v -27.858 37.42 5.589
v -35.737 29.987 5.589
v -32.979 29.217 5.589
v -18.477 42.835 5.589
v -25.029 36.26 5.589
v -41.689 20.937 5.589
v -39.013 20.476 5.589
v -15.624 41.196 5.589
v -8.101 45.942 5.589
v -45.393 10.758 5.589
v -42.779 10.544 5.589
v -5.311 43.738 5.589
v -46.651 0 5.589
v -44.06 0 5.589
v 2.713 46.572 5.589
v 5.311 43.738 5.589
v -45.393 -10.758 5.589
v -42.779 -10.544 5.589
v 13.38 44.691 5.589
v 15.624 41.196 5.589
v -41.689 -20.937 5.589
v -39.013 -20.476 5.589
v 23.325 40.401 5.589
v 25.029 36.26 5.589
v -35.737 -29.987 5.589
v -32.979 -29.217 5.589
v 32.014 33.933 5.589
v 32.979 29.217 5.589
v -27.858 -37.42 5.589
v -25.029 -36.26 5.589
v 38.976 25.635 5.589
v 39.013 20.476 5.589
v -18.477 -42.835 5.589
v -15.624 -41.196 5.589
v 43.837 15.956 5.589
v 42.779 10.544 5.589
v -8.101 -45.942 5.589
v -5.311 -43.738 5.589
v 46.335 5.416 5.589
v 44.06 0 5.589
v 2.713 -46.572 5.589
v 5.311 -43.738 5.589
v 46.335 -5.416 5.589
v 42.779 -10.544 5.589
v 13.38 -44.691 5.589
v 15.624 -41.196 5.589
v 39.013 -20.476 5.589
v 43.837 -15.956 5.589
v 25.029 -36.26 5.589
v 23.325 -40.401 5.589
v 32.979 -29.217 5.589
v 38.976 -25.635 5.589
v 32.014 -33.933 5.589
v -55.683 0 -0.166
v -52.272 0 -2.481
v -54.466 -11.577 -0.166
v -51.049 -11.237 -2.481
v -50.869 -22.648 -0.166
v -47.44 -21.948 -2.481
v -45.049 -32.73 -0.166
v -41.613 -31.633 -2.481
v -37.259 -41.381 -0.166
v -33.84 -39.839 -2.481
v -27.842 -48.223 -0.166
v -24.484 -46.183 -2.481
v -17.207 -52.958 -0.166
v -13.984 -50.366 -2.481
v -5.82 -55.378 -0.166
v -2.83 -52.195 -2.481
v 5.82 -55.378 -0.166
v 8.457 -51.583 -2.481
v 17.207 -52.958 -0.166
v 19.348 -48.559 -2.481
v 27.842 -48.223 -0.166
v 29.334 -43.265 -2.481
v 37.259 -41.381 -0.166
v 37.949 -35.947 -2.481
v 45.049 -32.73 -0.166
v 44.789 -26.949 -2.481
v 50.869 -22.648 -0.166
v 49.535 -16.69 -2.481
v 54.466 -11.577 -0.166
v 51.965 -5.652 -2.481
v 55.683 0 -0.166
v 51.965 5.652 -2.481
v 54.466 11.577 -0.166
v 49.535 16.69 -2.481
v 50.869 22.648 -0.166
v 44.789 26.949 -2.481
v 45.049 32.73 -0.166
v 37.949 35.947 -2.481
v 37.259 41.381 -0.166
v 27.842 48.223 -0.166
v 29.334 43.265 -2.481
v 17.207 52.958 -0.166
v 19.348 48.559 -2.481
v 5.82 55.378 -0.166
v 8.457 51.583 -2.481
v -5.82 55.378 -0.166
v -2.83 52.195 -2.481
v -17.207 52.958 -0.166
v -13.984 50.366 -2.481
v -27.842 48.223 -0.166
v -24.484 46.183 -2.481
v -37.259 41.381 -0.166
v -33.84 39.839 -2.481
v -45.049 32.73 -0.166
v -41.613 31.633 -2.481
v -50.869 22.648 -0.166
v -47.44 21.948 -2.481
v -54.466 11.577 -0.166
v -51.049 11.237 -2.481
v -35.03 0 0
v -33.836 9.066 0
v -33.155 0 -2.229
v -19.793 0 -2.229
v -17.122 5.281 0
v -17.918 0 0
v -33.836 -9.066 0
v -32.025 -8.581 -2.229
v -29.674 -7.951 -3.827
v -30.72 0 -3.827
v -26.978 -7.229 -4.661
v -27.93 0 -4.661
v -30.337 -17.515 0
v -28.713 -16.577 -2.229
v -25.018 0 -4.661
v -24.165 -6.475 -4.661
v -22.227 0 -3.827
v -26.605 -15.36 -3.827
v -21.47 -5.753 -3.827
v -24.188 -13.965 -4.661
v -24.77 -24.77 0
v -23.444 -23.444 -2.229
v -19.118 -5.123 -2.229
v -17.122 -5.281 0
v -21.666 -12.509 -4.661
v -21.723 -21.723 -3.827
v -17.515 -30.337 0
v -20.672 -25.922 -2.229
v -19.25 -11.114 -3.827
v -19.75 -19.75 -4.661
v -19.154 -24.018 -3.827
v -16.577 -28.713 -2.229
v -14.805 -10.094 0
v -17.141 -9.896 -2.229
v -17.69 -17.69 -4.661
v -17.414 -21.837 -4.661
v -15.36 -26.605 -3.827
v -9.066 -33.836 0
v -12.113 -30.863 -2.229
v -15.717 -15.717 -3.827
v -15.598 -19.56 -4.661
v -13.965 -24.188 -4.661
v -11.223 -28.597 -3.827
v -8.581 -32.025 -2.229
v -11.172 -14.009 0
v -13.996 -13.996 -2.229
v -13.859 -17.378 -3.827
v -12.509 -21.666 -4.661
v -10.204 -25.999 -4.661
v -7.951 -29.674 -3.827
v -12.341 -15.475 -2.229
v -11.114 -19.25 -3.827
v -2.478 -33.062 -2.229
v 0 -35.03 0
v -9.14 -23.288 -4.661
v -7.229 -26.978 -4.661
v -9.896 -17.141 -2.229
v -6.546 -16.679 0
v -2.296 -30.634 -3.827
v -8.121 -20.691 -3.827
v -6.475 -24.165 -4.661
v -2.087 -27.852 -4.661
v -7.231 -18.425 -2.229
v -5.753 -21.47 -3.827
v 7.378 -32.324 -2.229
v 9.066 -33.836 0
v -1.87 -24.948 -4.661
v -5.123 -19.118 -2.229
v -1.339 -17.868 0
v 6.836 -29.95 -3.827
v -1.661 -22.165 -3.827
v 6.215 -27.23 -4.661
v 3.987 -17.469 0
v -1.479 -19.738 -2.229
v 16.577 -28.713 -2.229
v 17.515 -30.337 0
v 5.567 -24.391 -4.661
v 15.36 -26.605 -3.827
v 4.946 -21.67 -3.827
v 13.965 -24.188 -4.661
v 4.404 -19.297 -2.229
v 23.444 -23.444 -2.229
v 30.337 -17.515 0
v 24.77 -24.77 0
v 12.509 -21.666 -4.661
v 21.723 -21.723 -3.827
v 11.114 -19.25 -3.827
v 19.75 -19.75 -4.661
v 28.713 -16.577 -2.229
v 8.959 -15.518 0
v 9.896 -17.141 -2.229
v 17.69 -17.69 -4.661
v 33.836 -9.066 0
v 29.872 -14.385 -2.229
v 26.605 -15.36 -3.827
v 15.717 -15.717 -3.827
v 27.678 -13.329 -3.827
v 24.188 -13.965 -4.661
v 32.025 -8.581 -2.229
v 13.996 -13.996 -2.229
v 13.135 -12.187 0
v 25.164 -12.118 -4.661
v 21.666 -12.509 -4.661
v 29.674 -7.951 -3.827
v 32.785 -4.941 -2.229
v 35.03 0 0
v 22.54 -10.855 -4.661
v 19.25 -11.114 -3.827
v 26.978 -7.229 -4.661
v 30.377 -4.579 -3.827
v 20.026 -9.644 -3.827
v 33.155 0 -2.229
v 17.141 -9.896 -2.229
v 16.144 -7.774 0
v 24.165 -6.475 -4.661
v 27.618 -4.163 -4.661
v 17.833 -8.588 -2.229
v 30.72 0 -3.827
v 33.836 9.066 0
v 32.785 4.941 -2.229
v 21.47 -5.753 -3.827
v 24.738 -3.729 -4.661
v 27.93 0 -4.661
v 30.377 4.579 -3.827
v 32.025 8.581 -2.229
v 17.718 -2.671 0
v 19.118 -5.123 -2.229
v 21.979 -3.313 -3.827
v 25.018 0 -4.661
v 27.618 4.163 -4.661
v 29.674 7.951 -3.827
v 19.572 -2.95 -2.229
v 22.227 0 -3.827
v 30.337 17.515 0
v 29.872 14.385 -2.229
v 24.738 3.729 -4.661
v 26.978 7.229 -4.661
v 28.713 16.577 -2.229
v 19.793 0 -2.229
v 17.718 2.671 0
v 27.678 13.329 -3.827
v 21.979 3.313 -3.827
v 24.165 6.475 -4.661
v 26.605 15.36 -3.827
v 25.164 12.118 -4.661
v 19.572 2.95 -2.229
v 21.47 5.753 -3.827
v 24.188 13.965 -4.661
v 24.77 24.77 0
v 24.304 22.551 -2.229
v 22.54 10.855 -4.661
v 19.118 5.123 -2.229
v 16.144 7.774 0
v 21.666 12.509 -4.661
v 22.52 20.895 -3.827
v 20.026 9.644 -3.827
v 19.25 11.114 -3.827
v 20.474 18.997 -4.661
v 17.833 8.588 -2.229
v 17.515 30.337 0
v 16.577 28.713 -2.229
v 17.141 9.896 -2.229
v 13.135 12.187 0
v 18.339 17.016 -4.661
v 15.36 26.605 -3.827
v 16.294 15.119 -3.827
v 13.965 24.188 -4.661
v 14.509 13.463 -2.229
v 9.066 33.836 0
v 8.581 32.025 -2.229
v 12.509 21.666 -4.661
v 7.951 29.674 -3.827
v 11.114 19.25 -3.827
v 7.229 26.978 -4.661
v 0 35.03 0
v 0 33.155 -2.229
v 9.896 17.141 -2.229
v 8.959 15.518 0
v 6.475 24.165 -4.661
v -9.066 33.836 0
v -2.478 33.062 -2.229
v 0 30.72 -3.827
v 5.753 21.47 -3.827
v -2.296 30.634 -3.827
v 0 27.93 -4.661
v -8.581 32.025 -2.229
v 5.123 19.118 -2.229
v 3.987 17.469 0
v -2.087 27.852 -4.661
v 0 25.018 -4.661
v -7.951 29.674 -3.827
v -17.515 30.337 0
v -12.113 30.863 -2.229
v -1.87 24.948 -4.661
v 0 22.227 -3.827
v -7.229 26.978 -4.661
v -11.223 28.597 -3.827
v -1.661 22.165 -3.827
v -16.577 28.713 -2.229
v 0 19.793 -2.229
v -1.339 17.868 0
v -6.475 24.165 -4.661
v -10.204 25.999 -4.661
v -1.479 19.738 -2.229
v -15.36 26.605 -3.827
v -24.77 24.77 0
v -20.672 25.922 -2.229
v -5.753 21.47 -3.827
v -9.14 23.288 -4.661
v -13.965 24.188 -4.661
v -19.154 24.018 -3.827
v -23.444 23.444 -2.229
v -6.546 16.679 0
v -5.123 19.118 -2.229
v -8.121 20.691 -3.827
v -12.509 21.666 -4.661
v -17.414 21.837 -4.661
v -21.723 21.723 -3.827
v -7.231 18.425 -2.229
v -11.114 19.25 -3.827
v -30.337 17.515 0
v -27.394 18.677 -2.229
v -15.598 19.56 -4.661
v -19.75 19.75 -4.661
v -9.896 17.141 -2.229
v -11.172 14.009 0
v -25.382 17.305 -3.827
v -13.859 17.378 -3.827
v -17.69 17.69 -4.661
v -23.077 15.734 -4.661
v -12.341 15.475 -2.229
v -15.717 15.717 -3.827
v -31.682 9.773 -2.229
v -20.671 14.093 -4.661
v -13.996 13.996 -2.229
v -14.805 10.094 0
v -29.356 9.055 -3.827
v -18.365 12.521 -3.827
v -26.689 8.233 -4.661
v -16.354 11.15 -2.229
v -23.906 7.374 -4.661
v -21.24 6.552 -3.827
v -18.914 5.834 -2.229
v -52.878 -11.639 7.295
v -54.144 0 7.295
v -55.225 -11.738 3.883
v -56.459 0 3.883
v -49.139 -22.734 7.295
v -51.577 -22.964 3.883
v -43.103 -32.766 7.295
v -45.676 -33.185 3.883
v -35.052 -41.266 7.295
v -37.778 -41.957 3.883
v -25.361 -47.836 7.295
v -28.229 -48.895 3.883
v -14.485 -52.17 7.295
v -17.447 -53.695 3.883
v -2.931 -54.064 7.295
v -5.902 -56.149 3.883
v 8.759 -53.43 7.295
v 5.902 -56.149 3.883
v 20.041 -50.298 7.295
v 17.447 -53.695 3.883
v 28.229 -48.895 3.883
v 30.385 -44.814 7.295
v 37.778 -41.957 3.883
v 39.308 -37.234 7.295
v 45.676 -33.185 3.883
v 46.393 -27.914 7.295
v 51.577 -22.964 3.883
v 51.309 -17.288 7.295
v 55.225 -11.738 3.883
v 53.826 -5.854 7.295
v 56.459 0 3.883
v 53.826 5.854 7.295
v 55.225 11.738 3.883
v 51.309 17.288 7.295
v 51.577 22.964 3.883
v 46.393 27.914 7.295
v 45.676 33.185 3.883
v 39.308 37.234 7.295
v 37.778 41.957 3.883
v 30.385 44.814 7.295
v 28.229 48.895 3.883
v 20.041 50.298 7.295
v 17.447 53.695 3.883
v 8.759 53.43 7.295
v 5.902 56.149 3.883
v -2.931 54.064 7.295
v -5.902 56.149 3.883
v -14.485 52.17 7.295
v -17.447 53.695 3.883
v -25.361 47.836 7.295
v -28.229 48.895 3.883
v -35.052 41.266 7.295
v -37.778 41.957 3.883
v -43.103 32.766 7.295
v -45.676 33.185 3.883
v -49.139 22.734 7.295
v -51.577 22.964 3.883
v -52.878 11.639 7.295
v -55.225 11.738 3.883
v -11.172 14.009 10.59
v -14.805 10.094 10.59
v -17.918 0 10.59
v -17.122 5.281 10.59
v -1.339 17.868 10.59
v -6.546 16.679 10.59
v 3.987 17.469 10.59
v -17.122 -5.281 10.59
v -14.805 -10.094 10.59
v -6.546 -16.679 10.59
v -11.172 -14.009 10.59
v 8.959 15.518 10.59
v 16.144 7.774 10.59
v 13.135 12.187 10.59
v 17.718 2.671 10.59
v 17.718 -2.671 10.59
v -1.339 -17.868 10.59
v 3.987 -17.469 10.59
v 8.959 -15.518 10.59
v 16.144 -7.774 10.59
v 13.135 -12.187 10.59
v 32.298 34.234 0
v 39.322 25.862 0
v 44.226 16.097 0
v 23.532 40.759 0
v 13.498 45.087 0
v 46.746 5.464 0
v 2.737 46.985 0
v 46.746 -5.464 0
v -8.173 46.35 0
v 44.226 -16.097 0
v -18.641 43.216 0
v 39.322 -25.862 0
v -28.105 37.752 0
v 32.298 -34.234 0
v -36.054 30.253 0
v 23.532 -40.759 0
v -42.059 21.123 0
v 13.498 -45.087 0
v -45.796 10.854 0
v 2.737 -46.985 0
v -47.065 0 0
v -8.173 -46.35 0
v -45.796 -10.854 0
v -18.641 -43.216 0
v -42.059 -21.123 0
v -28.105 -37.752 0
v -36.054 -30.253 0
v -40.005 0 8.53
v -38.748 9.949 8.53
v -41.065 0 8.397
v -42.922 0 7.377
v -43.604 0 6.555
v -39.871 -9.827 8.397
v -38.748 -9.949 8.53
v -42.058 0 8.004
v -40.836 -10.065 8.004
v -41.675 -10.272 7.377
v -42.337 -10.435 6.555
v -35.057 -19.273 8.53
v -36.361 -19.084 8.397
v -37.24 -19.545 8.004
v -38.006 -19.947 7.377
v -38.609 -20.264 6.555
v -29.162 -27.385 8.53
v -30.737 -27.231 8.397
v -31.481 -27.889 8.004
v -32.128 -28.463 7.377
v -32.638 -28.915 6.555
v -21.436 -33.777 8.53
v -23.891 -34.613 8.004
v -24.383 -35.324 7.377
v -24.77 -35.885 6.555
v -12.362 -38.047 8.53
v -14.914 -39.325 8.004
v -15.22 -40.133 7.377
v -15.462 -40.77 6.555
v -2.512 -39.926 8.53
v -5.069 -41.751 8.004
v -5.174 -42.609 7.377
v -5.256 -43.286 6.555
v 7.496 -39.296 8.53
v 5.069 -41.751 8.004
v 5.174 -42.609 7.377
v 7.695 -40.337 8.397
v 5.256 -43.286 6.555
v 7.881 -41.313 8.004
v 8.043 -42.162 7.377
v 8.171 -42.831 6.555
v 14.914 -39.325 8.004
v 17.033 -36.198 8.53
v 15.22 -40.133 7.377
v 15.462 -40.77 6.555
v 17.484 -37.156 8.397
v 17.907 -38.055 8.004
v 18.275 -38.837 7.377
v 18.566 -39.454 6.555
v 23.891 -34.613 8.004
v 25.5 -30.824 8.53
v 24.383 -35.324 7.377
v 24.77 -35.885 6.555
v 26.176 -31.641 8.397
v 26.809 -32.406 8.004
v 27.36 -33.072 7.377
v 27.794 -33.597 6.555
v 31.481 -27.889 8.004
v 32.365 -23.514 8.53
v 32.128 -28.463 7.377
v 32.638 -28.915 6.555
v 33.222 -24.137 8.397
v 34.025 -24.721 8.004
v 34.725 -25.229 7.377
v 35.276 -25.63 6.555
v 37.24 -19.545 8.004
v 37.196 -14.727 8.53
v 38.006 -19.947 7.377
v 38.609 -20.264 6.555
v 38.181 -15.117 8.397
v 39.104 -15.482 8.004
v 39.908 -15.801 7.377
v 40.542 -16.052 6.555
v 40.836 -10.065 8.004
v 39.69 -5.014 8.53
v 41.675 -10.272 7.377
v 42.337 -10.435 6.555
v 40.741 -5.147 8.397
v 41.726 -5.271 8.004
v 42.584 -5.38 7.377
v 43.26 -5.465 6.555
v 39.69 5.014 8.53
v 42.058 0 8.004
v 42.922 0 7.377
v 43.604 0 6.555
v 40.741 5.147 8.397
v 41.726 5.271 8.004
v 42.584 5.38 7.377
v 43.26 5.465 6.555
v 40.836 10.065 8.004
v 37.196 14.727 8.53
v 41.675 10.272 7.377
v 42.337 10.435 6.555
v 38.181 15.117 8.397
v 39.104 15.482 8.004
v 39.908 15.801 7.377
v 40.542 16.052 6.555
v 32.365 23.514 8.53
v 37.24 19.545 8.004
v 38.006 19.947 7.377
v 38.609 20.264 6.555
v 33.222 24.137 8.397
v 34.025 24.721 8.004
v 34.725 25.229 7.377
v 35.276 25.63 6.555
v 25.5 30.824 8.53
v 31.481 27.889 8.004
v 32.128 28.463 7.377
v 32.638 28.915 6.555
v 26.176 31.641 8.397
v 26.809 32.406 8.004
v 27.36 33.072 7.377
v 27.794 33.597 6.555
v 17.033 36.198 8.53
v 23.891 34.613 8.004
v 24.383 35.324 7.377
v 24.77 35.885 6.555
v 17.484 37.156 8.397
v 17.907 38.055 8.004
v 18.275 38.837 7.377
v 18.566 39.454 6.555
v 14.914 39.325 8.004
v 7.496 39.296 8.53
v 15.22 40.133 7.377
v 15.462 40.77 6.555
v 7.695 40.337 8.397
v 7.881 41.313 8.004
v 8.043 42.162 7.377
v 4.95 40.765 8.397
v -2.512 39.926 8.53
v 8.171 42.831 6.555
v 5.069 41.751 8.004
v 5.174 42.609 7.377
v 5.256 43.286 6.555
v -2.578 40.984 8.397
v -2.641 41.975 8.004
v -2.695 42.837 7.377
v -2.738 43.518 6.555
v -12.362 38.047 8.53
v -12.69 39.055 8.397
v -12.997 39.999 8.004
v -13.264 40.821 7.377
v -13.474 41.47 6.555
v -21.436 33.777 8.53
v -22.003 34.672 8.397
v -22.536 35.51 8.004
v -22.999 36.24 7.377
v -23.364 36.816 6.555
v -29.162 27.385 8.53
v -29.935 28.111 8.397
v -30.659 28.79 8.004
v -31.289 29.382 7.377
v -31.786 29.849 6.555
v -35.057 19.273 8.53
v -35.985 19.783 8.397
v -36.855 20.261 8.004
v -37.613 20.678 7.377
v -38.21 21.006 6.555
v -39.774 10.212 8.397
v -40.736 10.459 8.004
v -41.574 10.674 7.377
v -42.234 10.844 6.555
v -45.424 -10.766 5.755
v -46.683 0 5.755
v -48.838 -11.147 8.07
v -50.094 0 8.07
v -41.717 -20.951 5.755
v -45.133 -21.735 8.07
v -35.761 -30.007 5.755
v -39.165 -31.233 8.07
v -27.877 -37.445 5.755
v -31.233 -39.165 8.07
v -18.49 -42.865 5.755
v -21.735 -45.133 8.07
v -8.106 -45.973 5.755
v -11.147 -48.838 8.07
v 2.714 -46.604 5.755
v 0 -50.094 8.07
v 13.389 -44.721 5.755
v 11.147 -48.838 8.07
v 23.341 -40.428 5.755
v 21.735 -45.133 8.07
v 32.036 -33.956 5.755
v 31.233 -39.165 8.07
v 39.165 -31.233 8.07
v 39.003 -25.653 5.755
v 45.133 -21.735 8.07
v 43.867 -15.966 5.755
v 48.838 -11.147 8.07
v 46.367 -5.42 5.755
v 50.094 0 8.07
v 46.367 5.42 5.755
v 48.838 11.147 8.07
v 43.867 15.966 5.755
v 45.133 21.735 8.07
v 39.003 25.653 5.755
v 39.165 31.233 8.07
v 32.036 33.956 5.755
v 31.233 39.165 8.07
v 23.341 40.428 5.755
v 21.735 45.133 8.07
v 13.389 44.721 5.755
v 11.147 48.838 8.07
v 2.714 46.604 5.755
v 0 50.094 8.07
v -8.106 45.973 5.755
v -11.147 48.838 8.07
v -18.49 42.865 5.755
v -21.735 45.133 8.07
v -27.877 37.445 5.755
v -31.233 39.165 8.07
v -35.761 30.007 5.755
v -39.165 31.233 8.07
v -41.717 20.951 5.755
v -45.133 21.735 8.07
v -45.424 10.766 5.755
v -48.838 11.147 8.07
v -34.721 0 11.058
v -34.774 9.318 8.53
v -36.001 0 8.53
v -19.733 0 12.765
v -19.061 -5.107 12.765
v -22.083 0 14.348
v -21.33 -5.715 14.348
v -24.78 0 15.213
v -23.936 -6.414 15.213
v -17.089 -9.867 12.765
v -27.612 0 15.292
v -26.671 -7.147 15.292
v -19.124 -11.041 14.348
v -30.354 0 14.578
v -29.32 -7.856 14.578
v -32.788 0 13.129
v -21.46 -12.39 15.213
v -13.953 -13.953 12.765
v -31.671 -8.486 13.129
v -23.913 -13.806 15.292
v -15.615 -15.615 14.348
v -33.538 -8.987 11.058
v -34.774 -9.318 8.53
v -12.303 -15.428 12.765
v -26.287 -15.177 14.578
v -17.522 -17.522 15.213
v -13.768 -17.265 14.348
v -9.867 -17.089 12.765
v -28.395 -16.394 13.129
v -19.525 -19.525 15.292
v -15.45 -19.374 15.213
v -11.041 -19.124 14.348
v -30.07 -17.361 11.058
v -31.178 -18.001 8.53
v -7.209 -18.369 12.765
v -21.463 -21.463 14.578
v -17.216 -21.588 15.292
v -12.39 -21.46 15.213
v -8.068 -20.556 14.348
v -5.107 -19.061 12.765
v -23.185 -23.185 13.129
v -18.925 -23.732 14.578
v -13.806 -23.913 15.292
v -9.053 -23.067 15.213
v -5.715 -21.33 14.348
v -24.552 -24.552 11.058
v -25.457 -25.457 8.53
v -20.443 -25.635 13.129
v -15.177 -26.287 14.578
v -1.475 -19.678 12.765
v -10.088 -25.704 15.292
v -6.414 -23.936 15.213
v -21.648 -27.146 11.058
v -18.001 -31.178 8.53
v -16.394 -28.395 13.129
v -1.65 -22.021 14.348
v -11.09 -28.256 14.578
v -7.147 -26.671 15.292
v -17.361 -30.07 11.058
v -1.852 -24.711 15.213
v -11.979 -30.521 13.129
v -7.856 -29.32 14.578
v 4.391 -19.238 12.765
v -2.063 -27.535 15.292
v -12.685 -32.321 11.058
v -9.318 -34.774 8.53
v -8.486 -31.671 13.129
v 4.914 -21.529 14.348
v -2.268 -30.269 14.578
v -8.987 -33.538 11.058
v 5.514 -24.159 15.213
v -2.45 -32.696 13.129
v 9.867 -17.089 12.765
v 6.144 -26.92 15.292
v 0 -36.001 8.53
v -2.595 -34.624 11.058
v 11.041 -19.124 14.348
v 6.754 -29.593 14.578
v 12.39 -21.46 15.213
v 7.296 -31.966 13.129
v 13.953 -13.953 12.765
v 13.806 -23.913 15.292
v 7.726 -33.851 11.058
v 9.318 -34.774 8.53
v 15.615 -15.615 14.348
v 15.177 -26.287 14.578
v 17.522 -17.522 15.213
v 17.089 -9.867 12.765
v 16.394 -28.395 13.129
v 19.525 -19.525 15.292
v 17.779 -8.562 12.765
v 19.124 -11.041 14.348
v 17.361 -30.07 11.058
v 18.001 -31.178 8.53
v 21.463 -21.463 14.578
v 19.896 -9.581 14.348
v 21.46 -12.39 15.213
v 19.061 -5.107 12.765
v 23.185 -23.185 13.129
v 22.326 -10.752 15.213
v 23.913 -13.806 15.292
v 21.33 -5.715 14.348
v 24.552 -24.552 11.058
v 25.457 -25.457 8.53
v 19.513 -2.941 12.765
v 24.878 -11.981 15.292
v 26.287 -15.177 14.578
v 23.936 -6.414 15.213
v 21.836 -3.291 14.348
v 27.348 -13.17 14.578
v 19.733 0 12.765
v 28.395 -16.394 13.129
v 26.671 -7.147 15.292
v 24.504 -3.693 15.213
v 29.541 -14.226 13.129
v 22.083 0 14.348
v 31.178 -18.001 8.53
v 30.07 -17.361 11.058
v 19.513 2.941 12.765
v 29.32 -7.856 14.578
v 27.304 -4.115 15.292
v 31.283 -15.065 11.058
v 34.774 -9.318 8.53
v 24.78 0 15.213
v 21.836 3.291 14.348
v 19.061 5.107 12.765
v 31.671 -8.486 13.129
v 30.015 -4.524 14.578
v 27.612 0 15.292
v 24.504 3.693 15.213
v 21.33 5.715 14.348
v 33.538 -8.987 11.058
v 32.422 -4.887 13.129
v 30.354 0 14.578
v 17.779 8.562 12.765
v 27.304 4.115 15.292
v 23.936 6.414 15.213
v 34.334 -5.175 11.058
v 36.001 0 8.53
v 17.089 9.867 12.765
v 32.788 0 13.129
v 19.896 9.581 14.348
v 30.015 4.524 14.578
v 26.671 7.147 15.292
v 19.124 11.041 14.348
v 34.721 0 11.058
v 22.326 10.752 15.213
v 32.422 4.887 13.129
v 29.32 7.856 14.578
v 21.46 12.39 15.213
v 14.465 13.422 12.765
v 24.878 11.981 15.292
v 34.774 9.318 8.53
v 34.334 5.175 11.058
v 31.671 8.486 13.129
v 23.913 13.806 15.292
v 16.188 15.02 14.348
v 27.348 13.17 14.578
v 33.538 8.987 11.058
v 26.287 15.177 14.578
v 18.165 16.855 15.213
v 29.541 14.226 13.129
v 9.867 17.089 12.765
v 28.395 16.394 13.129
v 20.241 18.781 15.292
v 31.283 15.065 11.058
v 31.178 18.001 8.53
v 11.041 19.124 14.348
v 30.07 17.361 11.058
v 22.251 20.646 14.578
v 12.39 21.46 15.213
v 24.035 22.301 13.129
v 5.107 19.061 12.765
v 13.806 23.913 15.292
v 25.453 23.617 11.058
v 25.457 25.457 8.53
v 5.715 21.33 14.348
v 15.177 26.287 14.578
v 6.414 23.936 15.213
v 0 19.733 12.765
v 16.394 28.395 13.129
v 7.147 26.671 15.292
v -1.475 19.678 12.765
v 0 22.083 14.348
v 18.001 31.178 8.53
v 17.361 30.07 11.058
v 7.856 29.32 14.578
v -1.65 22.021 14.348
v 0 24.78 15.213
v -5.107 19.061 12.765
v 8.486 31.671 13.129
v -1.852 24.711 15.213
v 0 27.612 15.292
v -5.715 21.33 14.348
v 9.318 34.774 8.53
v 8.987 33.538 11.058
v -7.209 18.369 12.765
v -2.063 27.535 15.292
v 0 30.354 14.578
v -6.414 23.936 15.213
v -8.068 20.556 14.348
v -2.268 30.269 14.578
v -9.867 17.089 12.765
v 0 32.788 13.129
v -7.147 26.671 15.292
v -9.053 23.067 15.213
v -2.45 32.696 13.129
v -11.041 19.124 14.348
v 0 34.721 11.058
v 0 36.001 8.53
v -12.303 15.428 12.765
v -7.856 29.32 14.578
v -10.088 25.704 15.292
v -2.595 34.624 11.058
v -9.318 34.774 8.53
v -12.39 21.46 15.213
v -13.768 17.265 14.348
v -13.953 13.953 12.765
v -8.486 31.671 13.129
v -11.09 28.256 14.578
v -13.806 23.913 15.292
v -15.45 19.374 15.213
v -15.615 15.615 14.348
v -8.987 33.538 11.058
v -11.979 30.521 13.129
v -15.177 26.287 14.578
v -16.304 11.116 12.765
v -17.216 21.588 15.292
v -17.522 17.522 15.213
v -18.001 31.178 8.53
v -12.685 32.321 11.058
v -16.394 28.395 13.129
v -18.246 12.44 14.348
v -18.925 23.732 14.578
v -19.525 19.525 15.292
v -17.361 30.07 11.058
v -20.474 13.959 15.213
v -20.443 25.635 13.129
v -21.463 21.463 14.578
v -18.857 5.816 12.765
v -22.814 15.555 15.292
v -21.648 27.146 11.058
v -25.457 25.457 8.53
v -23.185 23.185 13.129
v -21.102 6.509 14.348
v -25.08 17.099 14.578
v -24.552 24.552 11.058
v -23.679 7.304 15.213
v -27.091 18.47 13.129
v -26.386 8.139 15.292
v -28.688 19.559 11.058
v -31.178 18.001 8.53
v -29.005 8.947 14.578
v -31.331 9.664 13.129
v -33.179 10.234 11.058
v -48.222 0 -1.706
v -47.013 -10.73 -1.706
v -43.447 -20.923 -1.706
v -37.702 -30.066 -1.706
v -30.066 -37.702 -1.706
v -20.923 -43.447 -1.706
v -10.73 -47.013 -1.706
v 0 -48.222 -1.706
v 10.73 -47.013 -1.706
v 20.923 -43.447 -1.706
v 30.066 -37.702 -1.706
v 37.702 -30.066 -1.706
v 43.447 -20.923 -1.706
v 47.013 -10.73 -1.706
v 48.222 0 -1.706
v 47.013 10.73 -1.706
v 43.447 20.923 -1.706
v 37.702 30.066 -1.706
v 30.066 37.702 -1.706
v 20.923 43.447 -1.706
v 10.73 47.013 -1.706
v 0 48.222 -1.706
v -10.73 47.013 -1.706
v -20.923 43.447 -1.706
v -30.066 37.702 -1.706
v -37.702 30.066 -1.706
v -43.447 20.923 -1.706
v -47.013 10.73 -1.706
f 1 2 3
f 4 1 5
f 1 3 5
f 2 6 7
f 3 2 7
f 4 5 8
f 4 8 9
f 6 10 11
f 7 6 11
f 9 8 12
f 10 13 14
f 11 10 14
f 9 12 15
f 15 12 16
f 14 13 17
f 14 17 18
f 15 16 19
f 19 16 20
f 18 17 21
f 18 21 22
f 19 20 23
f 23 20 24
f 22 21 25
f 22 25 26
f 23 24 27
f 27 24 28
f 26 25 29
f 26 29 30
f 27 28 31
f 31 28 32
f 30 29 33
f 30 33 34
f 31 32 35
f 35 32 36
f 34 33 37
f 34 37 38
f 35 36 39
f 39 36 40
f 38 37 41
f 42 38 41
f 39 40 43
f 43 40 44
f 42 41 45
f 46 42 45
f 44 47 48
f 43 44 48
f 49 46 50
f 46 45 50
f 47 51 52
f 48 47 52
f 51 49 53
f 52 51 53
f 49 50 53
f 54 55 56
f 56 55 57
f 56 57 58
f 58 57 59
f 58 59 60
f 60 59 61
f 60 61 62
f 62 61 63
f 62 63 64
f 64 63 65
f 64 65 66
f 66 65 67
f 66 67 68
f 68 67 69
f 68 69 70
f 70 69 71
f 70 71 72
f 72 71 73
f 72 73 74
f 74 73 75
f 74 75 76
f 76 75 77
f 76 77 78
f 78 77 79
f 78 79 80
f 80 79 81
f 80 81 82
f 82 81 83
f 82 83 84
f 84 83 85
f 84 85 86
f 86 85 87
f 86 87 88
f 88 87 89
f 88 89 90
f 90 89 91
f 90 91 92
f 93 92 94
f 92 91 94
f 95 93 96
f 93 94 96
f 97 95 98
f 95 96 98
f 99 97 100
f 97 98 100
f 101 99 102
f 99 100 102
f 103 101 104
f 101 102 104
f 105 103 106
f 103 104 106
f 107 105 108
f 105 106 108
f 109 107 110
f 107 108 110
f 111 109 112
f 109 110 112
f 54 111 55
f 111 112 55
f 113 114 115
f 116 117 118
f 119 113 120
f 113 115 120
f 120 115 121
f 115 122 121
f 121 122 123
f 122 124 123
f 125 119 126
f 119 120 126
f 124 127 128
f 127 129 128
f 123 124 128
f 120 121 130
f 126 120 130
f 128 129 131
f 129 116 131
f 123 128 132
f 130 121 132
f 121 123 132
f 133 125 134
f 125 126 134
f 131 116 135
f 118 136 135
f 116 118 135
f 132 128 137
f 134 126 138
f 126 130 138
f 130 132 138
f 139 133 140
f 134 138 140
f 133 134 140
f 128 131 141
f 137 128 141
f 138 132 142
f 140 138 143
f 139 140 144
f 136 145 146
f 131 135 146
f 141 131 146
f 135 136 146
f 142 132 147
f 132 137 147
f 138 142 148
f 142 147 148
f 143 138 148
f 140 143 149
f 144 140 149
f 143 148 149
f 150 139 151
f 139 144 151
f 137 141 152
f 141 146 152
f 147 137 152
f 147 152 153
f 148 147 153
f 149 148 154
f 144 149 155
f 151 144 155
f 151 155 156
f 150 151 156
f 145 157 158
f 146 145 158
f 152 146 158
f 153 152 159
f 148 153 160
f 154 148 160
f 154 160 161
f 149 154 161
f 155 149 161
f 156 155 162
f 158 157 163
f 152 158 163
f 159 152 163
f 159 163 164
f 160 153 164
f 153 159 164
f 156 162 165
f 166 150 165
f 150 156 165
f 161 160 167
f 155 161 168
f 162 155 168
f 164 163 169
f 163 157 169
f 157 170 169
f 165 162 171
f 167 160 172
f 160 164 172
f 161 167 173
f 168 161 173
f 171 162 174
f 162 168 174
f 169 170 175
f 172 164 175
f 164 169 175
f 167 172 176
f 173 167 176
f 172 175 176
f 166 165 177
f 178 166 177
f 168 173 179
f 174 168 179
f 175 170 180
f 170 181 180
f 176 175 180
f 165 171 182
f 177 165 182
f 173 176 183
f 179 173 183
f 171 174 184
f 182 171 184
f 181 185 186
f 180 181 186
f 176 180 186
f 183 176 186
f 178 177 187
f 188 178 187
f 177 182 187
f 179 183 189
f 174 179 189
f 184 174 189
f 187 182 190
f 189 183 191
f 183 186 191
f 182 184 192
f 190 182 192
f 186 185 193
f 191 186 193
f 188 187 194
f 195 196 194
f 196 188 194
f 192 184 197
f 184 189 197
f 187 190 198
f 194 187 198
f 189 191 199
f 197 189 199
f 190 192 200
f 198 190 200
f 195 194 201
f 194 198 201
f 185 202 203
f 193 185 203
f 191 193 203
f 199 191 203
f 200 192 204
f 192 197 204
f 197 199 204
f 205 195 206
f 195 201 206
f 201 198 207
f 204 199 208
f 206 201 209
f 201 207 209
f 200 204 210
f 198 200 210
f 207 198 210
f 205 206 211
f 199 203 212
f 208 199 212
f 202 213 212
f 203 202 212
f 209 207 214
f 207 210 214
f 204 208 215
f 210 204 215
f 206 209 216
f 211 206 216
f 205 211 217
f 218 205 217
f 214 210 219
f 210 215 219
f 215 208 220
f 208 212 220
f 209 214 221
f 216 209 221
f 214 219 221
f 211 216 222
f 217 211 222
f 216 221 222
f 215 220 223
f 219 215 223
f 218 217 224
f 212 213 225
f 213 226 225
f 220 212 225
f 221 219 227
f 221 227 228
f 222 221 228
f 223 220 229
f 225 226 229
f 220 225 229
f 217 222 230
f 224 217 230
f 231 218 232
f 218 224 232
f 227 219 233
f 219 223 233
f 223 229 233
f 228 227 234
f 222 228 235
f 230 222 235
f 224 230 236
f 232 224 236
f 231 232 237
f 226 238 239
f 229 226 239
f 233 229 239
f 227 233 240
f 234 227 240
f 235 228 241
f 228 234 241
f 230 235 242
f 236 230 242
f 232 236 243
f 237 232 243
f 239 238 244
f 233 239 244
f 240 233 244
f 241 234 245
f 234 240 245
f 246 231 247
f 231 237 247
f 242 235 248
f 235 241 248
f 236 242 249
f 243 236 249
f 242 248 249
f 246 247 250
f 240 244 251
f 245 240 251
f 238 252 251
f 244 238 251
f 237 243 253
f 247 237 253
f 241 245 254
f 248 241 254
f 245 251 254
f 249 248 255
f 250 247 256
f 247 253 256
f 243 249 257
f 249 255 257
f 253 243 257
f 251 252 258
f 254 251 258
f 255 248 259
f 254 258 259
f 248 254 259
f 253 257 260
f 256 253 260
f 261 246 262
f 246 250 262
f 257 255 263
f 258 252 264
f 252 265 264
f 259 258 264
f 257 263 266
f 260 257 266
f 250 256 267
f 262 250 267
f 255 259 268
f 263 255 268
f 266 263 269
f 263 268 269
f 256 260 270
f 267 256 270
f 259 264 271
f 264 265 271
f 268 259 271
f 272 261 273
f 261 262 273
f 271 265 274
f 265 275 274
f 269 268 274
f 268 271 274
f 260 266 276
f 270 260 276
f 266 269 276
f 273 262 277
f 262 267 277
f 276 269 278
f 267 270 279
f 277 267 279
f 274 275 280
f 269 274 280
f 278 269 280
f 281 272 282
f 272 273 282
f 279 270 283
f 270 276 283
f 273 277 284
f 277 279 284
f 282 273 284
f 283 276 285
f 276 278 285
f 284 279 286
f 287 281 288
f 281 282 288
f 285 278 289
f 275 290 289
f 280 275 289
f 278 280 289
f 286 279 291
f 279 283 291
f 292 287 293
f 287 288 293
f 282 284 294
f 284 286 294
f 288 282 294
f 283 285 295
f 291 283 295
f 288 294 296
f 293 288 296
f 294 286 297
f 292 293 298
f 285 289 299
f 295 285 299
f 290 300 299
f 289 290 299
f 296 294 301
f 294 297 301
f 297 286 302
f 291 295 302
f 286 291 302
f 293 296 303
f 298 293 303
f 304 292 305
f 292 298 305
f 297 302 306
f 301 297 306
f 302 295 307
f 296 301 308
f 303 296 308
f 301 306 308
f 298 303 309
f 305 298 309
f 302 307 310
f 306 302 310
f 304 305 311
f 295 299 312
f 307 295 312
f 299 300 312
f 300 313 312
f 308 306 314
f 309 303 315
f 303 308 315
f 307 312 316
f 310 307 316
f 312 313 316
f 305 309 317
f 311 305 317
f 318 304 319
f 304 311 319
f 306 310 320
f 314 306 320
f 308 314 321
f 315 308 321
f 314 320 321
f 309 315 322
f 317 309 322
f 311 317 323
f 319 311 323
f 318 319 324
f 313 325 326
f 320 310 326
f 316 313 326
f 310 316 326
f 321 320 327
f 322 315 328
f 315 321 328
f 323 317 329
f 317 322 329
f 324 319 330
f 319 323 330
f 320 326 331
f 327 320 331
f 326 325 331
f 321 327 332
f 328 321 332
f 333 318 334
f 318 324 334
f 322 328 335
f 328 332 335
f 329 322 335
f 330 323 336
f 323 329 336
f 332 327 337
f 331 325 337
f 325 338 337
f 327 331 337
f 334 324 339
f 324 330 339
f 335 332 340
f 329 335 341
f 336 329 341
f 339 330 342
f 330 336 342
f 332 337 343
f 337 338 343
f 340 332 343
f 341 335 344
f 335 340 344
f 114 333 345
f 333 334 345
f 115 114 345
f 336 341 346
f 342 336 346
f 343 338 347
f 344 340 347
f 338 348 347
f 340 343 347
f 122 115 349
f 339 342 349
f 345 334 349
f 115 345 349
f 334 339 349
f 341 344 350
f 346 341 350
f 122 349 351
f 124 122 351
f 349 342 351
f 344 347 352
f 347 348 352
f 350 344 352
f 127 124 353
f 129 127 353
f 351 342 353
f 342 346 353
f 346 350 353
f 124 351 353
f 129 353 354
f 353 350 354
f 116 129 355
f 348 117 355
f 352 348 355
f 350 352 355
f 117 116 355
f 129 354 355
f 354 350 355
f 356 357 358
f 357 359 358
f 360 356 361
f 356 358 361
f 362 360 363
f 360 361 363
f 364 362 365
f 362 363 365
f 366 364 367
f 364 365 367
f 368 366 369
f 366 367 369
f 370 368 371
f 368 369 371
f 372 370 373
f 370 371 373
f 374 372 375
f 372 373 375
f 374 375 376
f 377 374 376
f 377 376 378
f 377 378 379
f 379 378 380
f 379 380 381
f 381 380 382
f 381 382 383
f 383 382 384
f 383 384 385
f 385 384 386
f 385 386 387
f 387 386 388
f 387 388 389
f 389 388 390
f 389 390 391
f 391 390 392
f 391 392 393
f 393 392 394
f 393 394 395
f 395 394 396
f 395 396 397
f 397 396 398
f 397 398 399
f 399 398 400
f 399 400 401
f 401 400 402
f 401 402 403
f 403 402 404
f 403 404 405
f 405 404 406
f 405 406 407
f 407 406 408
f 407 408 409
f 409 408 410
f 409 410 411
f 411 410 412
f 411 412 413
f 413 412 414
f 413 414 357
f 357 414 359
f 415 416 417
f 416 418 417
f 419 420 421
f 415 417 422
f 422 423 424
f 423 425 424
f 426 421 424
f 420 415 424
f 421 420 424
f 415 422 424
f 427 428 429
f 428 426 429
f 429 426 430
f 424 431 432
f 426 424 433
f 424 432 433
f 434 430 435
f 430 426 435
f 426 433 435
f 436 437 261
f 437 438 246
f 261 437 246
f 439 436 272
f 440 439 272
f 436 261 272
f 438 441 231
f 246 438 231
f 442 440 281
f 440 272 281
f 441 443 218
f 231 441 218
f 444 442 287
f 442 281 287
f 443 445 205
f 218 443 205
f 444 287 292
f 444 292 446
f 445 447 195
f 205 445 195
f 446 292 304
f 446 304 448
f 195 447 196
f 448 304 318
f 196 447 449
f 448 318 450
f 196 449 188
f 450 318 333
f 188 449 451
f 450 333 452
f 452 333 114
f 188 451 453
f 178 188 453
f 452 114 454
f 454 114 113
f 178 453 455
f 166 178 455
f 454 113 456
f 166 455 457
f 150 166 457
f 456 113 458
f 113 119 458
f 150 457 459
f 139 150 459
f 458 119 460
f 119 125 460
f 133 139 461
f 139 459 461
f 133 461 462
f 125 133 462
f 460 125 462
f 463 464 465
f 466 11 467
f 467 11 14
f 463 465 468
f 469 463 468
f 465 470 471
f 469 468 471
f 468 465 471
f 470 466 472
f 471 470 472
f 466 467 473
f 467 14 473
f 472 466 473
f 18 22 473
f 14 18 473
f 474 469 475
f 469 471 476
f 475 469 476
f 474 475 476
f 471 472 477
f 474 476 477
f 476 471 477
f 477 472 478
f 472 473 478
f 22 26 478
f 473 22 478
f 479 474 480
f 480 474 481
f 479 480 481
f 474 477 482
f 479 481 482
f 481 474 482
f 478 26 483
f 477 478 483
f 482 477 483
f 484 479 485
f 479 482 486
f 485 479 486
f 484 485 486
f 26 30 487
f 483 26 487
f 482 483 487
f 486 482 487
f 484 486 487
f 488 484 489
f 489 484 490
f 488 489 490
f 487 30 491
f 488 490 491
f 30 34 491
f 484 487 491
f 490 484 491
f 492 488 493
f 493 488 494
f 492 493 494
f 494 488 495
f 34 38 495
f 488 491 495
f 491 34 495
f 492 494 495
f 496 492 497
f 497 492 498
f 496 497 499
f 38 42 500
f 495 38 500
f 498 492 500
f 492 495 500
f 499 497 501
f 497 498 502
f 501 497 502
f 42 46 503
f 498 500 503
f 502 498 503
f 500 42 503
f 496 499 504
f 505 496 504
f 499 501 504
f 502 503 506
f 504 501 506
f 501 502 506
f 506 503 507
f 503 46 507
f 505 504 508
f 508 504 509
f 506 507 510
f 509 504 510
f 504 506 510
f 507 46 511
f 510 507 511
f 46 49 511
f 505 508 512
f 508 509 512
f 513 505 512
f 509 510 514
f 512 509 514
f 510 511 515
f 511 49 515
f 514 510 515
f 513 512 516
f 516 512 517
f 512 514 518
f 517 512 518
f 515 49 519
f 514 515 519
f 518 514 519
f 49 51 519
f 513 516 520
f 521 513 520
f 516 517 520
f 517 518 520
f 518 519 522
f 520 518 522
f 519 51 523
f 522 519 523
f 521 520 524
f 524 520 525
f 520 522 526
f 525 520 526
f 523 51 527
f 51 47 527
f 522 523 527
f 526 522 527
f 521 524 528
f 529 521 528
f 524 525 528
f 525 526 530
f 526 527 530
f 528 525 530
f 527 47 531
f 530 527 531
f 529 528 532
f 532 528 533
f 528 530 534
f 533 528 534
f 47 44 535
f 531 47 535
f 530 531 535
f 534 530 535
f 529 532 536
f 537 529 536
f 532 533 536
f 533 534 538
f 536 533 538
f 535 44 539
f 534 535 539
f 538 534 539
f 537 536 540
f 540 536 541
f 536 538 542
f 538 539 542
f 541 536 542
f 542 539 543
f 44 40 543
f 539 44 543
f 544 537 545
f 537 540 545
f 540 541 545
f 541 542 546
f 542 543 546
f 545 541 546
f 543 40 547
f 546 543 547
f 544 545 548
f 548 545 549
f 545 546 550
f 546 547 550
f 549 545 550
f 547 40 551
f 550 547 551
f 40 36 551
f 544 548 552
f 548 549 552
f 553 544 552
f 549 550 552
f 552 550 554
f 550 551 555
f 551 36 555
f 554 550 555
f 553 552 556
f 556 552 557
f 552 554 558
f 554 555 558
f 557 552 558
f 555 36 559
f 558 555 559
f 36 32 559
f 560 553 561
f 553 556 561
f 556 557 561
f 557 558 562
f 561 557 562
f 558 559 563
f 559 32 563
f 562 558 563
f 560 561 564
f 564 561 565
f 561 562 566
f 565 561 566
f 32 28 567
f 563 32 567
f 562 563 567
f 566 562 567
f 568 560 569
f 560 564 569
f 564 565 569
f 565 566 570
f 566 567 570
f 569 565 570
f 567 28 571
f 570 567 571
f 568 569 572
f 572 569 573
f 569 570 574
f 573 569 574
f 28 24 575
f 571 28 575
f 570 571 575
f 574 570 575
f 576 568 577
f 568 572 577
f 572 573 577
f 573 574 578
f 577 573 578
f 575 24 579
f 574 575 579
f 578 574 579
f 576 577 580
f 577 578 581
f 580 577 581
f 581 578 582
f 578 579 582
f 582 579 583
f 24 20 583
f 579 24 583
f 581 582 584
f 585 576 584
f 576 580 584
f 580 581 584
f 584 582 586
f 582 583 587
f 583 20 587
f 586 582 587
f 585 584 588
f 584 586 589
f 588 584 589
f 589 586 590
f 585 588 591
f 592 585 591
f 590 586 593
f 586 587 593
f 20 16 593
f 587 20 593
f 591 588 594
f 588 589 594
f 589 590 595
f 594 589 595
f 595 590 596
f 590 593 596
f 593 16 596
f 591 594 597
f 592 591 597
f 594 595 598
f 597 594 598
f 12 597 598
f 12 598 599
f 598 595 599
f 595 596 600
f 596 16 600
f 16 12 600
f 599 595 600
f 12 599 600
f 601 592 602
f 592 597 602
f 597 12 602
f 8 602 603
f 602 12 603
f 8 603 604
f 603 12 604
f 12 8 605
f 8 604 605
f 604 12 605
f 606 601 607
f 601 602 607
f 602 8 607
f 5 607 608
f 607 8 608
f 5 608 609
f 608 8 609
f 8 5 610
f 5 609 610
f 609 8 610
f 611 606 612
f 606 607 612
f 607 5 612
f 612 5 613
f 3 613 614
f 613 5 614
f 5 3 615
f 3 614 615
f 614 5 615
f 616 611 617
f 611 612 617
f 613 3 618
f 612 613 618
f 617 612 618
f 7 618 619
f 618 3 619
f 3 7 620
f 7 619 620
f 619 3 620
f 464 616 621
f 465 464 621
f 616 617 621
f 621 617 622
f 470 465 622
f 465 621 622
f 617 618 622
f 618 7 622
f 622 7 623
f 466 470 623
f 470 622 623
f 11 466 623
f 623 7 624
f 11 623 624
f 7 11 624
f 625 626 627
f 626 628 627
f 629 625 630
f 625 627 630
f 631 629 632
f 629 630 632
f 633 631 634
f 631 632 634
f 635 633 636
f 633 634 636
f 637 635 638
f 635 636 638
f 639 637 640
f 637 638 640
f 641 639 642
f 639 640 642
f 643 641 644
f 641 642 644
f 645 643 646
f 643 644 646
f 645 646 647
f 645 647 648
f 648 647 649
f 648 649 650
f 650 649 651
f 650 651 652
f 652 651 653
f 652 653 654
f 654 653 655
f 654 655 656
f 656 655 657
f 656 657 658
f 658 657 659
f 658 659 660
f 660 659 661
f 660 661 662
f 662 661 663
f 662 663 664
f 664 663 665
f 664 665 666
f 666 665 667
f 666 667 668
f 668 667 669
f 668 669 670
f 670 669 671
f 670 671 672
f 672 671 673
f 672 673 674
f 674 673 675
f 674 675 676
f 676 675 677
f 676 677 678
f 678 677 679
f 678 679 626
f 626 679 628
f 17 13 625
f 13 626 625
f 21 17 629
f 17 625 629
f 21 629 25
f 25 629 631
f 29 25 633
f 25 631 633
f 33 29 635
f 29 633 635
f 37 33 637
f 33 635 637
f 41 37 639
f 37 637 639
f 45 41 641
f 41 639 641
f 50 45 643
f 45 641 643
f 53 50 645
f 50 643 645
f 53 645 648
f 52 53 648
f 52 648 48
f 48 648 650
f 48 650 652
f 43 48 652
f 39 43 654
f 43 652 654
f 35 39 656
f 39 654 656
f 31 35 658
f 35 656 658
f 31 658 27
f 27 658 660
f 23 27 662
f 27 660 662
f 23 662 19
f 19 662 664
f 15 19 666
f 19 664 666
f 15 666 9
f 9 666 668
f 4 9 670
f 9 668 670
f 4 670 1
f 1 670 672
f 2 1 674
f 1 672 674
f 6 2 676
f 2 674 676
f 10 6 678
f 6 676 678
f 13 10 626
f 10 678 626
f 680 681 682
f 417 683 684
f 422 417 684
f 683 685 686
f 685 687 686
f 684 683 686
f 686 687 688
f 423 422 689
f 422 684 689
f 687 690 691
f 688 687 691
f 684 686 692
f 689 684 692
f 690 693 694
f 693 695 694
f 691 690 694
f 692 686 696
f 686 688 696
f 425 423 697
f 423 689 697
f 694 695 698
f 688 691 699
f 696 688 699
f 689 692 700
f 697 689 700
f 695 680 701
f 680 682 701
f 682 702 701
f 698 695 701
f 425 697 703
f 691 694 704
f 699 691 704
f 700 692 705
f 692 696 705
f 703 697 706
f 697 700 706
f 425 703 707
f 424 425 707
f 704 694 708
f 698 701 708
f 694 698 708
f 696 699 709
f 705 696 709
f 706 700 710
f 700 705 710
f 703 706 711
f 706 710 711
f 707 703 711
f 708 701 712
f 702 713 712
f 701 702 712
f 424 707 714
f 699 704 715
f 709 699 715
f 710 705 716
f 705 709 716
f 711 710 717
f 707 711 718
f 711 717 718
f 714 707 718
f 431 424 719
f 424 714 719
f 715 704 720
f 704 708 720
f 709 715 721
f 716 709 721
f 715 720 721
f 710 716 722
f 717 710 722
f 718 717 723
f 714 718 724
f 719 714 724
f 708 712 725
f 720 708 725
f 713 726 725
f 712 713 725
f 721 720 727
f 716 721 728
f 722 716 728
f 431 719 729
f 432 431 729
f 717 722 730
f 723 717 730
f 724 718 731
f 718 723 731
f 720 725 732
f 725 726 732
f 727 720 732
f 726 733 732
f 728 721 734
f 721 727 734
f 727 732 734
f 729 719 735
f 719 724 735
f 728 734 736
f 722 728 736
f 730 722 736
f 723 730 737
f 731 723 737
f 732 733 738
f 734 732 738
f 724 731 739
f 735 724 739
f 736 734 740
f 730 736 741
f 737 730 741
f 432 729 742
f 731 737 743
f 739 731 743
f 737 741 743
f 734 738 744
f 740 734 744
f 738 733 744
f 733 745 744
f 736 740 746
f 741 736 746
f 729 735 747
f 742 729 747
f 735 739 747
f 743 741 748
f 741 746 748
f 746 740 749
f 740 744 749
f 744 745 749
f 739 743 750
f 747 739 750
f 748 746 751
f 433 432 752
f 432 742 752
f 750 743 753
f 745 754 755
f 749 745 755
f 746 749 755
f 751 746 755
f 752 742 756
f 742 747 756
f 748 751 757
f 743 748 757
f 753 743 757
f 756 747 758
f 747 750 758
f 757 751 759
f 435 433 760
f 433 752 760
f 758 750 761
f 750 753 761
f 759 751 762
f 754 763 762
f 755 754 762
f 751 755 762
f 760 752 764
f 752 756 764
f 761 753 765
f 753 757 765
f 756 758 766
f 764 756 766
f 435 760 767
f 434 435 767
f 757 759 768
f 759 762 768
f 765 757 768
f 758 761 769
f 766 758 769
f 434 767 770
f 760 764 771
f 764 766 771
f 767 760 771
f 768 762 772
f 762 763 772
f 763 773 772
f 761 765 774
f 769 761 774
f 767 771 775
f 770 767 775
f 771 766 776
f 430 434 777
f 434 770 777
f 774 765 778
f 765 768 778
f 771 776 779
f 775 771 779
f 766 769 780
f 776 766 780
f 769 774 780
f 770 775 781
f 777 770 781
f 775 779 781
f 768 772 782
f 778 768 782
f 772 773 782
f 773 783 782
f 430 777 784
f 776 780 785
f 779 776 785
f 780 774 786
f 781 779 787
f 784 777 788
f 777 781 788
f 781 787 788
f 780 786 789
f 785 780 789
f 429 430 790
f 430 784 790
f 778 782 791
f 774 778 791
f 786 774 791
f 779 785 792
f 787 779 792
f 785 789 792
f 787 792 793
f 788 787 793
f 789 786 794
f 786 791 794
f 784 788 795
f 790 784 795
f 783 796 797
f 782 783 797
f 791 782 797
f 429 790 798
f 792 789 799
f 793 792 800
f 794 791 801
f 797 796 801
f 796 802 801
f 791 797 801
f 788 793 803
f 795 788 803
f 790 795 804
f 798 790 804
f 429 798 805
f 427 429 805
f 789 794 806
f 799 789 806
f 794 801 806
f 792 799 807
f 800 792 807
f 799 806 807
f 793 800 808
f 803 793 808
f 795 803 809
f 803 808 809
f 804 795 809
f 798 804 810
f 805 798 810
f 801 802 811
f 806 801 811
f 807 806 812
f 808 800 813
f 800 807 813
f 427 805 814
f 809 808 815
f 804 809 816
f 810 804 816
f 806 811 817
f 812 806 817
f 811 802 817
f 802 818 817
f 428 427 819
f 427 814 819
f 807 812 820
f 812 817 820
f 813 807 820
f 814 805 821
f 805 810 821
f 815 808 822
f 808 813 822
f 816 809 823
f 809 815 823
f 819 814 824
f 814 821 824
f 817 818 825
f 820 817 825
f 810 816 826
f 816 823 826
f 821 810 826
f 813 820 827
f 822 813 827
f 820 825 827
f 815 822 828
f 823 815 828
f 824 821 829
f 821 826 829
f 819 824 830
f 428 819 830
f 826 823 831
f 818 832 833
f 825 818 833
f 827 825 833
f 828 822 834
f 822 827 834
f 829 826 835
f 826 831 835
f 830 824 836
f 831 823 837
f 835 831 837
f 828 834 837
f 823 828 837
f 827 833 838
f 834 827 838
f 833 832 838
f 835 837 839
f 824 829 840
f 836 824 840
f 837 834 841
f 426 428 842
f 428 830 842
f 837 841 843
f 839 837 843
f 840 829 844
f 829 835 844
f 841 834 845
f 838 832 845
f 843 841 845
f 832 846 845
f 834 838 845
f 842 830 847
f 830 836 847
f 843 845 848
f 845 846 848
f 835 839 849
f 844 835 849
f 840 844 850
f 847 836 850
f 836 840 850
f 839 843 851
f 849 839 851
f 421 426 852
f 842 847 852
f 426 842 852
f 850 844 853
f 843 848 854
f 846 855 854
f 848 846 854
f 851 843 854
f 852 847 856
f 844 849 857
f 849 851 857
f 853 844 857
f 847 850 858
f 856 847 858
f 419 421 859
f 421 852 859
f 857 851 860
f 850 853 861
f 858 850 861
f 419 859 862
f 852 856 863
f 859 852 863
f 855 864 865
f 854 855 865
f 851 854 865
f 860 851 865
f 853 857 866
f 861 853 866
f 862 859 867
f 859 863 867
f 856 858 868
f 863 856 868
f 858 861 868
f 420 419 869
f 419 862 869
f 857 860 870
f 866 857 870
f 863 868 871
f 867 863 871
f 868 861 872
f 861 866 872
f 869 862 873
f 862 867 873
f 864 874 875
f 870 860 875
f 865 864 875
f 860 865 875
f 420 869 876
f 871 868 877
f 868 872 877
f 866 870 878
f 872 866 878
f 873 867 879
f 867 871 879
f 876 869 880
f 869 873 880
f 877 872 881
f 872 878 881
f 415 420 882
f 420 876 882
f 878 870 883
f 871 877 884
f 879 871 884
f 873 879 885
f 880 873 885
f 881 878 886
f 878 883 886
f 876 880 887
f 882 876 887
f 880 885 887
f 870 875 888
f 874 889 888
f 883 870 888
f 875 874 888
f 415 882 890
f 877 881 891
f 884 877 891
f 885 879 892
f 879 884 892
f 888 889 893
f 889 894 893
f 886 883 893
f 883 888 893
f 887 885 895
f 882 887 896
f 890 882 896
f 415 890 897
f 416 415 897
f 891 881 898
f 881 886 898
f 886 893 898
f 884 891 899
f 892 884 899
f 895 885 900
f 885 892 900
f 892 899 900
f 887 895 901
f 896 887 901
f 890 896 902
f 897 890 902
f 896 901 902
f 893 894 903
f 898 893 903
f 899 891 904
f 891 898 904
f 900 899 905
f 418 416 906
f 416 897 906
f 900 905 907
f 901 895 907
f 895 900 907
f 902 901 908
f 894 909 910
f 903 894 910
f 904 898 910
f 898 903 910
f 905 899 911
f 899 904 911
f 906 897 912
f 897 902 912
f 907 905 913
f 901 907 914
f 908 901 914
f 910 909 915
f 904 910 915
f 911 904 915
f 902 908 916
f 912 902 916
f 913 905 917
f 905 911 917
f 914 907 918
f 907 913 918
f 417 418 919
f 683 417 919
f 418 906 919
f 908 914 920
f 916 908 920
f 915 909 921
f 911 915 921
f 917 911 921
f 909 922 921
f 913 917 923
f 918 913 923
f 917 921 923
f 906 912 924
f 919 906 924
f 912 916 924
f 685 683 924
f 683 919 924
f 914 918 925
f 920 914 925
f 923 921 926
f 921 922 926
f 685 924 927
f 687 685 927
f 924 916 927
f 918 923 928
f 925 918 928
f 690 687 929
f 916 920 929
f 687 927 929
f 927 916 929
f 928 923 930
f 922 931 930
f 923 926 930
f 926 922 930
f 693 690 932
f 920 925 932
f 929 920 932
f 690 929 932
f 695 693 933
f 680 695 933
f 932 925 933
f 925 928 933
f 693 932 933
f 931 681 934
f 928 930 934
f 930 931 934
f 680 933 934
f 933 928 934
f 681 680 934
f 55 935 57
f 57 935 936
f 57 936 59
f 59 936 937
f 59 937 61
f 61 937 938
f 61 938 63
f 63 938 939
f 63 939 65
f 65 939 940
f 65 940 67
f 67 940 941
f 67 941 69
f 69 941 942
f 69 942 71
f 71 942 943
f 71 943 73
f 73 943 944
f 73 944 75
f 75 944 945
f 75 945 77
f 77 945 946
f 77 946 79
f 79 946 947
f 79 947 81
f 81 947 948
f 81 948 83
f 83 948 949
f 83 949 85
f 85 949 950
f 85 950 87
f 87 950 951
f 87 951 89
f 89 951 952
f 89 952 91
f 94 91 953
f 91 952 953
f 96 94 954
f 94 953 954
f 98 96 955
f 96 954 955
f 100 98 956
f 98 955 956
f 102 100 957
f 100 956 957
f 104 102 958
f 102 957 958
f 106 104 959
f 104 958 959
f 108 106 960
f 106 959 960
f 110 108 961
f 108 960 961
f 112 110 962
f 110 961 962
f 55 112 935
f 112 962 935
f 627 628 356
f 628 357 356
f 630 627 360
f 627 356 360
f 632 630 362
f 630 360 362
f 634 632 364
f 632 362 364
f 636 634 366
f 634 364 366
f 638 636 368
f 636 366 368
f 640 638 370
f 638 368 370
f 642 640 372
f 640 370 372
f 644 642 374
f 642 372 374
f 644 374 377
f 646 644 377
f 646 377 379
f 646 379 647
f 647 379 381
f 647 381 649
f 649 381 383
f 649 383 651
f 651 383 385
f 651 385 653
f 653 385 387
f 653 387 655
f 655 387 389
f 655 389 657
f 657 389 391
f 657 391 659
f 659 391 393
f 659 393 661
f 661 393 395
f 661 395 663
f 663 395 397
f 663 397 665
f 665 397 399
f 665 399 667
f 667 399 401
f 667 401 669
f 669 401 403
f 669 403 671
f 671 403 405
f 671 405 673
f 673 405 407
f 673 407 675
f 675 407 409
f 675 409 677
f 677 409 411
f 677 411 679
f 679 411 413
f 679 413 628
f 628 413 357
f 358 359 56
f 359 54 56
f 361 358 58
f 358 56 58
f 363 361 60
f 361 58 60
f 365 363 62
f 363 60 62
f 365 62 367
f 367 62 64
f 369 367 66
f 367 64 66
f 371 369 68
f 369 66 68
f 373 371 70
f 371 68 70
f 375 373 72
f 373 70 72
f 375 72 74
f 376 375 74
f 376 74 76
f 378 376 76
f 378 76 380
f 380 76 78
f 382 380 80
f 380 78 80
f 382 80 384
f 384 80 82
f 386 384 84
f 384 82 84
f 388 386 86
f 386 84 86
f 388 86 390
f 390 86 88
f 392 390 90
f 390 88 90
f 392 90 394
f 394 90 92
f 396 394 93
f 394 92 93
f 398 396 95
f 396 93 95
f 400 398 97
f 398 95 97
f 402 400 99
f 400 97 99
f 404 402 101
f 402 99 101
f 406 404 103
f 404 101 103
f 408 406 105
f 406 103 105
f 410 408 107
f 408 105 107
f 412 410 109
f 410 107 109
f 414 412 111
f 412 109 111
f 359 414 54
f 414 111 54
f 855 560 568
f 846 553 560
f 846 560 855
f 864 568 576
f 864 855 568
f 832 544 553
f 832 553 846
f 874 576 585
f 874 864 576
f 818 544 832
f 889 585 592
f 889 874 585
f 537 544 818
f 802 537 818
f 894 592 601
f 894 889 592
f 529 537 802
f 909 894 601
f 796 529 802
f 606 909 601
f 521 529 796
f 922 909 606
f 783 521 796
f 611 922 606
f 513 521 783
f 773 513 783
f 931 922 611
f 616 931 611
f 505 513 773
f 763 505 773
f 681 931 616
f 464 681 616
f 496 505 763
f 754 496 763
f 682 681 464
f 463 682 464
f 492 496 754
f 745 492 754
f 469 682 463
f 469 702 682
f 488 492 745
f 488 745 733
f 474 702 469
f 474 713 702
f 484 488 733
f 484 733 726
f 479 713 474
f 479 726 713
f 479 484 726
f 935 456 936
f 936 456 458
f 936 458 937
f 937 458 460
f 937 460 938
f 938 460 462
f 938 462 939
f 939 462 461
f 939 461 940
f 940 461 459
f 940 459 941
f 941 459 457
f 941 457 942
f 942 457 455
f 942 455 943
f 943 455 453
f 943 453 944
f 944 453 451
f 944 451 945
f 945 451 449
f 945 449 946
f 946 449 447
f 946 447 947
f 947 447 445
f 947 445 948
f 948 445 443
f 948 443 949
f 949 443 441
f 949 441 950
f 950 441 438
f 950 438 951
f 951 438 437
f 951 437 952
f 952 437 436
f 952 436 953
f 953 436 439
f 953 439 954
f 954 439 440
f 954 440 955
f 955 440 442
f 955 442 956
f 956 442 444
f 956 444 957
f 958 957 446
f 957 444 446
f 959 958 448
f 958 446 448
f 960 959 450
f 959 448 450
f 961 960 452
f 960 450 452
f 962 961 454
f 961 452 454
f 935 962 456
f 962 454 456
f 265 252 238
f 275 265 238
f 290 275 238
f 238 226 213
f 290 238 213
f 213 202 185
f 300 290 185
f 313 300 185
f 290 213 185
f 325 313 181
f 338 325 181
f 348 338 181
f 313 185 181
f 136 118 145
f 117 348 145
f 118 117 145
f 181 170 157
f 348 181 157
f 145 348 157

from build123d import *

# Parameters (mm, degrees)
F2_W = 40.0049984455
F2_H = 8.5304779932


with BuildPart() as f1:
    # F0 (on Front) → F1 (revolve)
    with BuildSketch(Plane.XZ):
        with BuildLine():
            Line((-17.918098104, 0), (0, 0))
            Line((0, 0), (0, 10.5895595625))
            Line((0, 10.5895595625), (-17.918098104, 10.5895595625))
            ThreePointArc((-17.918098104, 10.5895595625), (-36.5355256935, 5.2947797813), (-17.918098104, 0))
        make_face()
    revolve(axis=Axis((0, 0, 5.2947797813), (0, 0, 1)))

    # F2 (on Front) → F3 (revolve)
    with BuildSketch(Plane.XZ):
        with Locations((-20.0024992228, 4.2652389966)):
            Rectangle(F2_W, F2_H)
        with BuildLine():
            ThreePointArc((-40.0049984455, 8.5304779932), (-44.2702374421, 4.2652389966), (-40.0049984455, 0))
            Line((-40.0049984455, 0), (-40.0049984455, 8.5304779932))
        make_face()
    revolve(axis=Axis((0, 0, 4.2652389966), (0, 0, 1)))

    # F4 (on Front) → F5 (revolve)
    with BuildSketch(Plane.XZ):
        Polygon((-47.0647066832, 0), (0, 0), (0, 5.5889338255), (-46.6507802162, 5.5889338255), (-45.9072005883, 1.7057990241), align=None)
        Polygon((-48.222212778, -1.7057990241), (-47.0647066832, 0), (-51.1828698218, 0), (-51.1828698218, 5.5889338255), (-46.6507802162, 5.5889338255), (-46.682603885, 5.7551239565), (-50.0942019331, 8.0701361462), (-54.1435268656, 7.2947328496), (-56.4585390553, 3.8831348014), (-55.6831357586, -0.166190131), (-52.2715377104, -2.4812023207), align=None)
        Polygon((-51.1828698218, 0), (-47.0647066832, 0), (-45.9072005883, 1.7057990241), (-46.6507802162, 5.5889338255), (-51.1828698218, 5.5889338255), align=None)
    revolve(axis=Axis((0, 0, 2.7944669127), (0, 0, 1)))


solid = f1.part
